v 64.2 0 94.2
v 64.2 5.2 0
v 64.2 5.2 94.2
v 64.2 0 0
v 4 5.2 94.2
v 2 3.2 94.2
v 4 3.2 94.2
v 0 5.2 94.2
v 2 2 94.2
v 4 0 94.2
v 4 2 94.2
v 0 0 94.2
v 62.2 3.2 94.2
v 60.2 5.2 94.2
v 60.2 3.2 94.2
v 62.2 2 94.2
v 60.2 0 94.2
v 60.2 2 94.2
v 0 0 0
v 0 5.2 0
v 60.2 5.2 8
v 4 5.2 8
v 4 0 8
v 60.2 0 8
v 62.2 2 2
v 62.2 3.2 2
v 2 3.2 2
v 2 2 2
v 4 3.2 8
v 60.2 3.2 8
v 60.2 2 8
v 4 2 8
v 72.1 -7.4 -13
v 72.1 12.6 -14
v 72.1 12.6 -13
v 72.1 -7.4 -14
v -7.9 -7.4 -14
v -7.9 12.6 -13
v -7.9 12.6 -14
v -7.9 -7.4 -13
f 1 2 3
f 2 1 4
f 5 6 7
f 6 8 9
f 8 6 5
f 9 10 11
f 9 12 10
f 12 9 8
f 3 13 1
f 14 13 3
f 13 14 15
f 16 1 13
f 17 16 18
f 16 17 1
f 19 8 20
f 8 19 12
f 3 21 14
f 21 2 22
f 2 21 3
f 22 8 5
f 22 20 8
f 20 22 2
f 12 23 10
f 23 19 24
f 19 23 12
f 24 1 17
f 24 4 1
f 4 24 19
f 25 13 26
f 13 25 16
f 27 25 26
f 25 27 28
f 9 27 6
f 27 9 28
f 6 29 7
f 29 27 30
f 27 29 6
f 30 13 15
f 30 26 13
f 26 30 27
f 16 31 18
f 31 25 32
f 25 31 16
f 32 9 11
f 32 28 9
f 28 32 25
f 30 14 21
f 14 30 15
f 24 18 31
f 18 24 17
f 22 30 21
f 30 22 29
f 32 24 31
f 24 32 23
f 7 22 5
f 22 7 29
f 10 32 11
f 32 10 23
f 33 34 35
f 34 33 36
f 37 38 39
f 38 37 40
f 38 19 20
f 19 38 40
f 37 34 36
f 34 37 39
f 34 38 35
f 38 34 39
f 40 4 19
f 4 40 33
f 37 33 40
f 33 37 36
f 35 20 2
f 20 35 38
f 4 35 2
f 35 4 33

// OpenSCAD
CARD = [60, 1, 90];

TOLERANCE = [.2, .2, .2];

BASE = [80,20, 1];
BASE_HEIGHT = 14;

slot =  CARD + TOLERANCE;

FRAME_OVERHANG = [2, 0, 2];
WALL = [2, 2, 2];


module window()
{
    cube(slot - FRAME_OVERHANG*2 +[0,WALL[1]*2, 0]);
}

module sleeve()
{
    difference()
    {
        cube(slot+WALL*2);
        translate([WALL[0], WALL[1], WALL[2]])
            cube(slot + [0, 0, WALL[2]]);
        translate([WALL[0] + FRAME_OVERHANG[0], 0, WALL[2]*2 + FRAME_OVERHANG[2]*2])
                window();
    }
}

hull()
{
    translate([ -(BASE[0] - (CARD[0] + TOLERANCE[0] + WALL[0]*2)) / 2 ,
                -(BASE[1] - (CARD[1] + TOLERANCE[1] + WALL[1]*2)) / 2 ,
                -BASE_HEIGHT])
        cube(BASE);
    translate([0,0,-1])
        cube([CARD[0] + TOLERANCE[0] + WALL[0]*2, CARD[1]+TOLERANCE[1]+WALL[1]*2, 1]);

}

sleeve();
